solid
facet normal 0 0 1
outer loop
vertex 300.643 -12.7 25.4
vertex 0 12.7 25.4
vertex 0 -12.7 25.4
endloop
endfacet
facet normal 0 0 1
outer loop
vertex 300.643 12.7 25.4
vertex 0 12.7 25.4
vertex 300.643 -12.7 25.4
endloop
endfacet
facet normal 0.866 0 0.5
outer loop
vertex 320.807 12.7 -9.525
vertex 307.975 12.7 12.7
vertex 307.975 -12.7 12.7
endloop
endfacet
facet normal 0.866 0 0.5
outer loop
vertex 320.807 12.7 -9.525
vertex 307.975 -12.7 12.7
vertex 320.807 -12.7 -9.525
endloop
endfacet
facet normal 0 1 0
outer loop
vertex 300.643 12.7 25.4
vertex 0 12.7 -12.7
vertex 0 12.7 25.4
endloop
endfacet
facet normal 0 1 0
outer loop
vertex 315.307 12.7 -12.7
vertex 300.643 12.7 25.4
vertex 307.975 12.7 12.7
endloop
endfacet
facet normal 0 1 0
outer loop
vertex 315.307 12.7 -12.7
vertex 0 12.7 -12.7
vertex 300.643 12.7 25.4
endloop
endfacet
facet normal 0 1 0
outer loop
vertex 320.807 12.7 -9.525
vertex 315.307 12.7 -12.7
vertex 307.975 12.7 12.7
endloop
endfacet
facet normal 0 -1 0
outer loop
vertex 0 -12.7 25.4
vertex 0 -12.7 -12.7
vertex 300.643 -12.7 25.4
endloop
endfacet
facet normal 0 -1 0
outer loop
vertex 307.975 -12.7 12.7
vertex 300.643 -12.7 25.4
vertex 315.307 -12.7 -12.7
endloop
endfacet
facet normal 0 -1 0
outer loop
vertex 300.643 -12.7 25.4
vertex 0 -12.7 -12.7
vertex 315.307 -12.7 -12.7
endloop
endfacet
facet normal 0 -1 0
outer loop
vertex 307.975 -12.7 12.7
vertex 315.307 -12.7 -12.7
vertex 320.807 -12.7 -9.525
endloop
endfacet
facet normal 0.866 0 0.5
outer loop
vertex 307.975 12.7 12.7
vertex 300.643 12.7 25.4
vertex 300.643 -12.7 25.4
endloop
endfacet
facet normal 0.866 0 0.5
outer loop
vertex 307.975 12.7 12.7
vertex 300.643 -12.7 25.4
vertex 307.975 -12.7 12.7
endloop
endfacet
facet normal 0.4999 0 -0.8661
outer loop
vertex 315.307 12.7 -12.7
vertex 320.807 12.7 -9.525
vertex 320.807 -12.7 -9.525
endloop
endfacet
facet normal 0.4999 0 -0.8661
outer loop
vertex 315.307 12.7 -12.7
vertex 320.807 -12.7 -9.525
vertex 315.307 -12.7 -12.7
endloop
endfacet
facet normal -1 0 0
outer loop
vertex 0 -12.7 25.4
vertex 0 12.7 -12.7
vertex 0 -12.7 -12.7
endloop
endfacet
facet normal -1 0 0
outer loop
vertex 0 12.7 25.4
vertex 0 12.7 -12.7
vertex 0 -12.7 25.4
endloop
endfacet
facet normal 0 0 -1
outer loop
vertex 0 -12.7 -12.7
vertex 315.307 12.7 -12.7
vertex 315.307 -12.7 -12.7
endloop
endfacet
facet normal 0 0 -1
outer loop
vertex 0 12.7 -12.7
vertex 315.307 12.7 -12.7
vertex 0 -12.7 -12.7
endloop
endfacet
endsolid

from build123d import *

# Parameters (mm, degrees)
SKETCH1_W               = 25.4
SKETCH1_H               = 25.4
BOSS_EXTRUDE1_DEPTH     = 307.975
BOSS_EXTRUDE2_DEPTH     = 25.4
CUT_EXTRUDE1_DEPTH      = 323.061066955
CUT_EXTRUDE1_DEPTH_BACK = 323.061066955
BOSS_EXTRUDE3_DEPTH     = 25.4


with BuildPart() as part:
    # Sketch1 → Boss-Extrude1 (new body)
    with BuildSketch(Plane(origin=(0, 0, 0), x_dir=(0, 0, -1), z_dir=(1, 0, 0))):
        Rectangle(SKETCH1_W, SKETCH1_H)
    extrude(amount=BOSS_EXTRUDE1_DEPTH)

    # Sketch2 → Boss-Extrude2 (add)
    with BuildSketch(Plane(origin=(0, 12.7, 0), x_dir=(1, 0, 0), z_dir=(0, 1, 0))):
        Polygon((307.975, -12.7), (320.806609733, 9.525), (320.806609733, 12.7), (307.975, 12.7), align=None)
    extrude(amount=-BOSS_EXTRUDE2_DEPTH)

    # Sketch3 → Cut-Extrude1 (cut, two sides: drawn at the far end of the back side and taken through both)
    with BuildSketch(Plane(origin=(0, 12.7, 0), x_dir=(1, 0, 0), z_dir=(0, 1, 0)).offset(-CUT_EXTRUDE1_DEPTH_BACK)):
        Polygon((320.806609733, 9.525), (315.307348419, 12.7), (320.806609733, 12.7), align=None)
    extrude(amount=CUT_EXTRUDE1_DEPTH + CUT_EXTRUDE1_DEPTH_BACK, mode=Mode.SUBTRACT)

    # Sketch4 → Boss-Extrude3 (add)
    with BuildSketch(Plane(origin=(0, 12.7, 0), x_dir=(1, 0, 0), z_dir=(0, 1, 0))):
        Polygon((0, -12.7), (0, -25.4), (300.642651581, -25.4), (307.975, -12.7), align=None)
    extrude(amount=-BOSS_EXTRUDE3_DEPTH)


solid = part.part
